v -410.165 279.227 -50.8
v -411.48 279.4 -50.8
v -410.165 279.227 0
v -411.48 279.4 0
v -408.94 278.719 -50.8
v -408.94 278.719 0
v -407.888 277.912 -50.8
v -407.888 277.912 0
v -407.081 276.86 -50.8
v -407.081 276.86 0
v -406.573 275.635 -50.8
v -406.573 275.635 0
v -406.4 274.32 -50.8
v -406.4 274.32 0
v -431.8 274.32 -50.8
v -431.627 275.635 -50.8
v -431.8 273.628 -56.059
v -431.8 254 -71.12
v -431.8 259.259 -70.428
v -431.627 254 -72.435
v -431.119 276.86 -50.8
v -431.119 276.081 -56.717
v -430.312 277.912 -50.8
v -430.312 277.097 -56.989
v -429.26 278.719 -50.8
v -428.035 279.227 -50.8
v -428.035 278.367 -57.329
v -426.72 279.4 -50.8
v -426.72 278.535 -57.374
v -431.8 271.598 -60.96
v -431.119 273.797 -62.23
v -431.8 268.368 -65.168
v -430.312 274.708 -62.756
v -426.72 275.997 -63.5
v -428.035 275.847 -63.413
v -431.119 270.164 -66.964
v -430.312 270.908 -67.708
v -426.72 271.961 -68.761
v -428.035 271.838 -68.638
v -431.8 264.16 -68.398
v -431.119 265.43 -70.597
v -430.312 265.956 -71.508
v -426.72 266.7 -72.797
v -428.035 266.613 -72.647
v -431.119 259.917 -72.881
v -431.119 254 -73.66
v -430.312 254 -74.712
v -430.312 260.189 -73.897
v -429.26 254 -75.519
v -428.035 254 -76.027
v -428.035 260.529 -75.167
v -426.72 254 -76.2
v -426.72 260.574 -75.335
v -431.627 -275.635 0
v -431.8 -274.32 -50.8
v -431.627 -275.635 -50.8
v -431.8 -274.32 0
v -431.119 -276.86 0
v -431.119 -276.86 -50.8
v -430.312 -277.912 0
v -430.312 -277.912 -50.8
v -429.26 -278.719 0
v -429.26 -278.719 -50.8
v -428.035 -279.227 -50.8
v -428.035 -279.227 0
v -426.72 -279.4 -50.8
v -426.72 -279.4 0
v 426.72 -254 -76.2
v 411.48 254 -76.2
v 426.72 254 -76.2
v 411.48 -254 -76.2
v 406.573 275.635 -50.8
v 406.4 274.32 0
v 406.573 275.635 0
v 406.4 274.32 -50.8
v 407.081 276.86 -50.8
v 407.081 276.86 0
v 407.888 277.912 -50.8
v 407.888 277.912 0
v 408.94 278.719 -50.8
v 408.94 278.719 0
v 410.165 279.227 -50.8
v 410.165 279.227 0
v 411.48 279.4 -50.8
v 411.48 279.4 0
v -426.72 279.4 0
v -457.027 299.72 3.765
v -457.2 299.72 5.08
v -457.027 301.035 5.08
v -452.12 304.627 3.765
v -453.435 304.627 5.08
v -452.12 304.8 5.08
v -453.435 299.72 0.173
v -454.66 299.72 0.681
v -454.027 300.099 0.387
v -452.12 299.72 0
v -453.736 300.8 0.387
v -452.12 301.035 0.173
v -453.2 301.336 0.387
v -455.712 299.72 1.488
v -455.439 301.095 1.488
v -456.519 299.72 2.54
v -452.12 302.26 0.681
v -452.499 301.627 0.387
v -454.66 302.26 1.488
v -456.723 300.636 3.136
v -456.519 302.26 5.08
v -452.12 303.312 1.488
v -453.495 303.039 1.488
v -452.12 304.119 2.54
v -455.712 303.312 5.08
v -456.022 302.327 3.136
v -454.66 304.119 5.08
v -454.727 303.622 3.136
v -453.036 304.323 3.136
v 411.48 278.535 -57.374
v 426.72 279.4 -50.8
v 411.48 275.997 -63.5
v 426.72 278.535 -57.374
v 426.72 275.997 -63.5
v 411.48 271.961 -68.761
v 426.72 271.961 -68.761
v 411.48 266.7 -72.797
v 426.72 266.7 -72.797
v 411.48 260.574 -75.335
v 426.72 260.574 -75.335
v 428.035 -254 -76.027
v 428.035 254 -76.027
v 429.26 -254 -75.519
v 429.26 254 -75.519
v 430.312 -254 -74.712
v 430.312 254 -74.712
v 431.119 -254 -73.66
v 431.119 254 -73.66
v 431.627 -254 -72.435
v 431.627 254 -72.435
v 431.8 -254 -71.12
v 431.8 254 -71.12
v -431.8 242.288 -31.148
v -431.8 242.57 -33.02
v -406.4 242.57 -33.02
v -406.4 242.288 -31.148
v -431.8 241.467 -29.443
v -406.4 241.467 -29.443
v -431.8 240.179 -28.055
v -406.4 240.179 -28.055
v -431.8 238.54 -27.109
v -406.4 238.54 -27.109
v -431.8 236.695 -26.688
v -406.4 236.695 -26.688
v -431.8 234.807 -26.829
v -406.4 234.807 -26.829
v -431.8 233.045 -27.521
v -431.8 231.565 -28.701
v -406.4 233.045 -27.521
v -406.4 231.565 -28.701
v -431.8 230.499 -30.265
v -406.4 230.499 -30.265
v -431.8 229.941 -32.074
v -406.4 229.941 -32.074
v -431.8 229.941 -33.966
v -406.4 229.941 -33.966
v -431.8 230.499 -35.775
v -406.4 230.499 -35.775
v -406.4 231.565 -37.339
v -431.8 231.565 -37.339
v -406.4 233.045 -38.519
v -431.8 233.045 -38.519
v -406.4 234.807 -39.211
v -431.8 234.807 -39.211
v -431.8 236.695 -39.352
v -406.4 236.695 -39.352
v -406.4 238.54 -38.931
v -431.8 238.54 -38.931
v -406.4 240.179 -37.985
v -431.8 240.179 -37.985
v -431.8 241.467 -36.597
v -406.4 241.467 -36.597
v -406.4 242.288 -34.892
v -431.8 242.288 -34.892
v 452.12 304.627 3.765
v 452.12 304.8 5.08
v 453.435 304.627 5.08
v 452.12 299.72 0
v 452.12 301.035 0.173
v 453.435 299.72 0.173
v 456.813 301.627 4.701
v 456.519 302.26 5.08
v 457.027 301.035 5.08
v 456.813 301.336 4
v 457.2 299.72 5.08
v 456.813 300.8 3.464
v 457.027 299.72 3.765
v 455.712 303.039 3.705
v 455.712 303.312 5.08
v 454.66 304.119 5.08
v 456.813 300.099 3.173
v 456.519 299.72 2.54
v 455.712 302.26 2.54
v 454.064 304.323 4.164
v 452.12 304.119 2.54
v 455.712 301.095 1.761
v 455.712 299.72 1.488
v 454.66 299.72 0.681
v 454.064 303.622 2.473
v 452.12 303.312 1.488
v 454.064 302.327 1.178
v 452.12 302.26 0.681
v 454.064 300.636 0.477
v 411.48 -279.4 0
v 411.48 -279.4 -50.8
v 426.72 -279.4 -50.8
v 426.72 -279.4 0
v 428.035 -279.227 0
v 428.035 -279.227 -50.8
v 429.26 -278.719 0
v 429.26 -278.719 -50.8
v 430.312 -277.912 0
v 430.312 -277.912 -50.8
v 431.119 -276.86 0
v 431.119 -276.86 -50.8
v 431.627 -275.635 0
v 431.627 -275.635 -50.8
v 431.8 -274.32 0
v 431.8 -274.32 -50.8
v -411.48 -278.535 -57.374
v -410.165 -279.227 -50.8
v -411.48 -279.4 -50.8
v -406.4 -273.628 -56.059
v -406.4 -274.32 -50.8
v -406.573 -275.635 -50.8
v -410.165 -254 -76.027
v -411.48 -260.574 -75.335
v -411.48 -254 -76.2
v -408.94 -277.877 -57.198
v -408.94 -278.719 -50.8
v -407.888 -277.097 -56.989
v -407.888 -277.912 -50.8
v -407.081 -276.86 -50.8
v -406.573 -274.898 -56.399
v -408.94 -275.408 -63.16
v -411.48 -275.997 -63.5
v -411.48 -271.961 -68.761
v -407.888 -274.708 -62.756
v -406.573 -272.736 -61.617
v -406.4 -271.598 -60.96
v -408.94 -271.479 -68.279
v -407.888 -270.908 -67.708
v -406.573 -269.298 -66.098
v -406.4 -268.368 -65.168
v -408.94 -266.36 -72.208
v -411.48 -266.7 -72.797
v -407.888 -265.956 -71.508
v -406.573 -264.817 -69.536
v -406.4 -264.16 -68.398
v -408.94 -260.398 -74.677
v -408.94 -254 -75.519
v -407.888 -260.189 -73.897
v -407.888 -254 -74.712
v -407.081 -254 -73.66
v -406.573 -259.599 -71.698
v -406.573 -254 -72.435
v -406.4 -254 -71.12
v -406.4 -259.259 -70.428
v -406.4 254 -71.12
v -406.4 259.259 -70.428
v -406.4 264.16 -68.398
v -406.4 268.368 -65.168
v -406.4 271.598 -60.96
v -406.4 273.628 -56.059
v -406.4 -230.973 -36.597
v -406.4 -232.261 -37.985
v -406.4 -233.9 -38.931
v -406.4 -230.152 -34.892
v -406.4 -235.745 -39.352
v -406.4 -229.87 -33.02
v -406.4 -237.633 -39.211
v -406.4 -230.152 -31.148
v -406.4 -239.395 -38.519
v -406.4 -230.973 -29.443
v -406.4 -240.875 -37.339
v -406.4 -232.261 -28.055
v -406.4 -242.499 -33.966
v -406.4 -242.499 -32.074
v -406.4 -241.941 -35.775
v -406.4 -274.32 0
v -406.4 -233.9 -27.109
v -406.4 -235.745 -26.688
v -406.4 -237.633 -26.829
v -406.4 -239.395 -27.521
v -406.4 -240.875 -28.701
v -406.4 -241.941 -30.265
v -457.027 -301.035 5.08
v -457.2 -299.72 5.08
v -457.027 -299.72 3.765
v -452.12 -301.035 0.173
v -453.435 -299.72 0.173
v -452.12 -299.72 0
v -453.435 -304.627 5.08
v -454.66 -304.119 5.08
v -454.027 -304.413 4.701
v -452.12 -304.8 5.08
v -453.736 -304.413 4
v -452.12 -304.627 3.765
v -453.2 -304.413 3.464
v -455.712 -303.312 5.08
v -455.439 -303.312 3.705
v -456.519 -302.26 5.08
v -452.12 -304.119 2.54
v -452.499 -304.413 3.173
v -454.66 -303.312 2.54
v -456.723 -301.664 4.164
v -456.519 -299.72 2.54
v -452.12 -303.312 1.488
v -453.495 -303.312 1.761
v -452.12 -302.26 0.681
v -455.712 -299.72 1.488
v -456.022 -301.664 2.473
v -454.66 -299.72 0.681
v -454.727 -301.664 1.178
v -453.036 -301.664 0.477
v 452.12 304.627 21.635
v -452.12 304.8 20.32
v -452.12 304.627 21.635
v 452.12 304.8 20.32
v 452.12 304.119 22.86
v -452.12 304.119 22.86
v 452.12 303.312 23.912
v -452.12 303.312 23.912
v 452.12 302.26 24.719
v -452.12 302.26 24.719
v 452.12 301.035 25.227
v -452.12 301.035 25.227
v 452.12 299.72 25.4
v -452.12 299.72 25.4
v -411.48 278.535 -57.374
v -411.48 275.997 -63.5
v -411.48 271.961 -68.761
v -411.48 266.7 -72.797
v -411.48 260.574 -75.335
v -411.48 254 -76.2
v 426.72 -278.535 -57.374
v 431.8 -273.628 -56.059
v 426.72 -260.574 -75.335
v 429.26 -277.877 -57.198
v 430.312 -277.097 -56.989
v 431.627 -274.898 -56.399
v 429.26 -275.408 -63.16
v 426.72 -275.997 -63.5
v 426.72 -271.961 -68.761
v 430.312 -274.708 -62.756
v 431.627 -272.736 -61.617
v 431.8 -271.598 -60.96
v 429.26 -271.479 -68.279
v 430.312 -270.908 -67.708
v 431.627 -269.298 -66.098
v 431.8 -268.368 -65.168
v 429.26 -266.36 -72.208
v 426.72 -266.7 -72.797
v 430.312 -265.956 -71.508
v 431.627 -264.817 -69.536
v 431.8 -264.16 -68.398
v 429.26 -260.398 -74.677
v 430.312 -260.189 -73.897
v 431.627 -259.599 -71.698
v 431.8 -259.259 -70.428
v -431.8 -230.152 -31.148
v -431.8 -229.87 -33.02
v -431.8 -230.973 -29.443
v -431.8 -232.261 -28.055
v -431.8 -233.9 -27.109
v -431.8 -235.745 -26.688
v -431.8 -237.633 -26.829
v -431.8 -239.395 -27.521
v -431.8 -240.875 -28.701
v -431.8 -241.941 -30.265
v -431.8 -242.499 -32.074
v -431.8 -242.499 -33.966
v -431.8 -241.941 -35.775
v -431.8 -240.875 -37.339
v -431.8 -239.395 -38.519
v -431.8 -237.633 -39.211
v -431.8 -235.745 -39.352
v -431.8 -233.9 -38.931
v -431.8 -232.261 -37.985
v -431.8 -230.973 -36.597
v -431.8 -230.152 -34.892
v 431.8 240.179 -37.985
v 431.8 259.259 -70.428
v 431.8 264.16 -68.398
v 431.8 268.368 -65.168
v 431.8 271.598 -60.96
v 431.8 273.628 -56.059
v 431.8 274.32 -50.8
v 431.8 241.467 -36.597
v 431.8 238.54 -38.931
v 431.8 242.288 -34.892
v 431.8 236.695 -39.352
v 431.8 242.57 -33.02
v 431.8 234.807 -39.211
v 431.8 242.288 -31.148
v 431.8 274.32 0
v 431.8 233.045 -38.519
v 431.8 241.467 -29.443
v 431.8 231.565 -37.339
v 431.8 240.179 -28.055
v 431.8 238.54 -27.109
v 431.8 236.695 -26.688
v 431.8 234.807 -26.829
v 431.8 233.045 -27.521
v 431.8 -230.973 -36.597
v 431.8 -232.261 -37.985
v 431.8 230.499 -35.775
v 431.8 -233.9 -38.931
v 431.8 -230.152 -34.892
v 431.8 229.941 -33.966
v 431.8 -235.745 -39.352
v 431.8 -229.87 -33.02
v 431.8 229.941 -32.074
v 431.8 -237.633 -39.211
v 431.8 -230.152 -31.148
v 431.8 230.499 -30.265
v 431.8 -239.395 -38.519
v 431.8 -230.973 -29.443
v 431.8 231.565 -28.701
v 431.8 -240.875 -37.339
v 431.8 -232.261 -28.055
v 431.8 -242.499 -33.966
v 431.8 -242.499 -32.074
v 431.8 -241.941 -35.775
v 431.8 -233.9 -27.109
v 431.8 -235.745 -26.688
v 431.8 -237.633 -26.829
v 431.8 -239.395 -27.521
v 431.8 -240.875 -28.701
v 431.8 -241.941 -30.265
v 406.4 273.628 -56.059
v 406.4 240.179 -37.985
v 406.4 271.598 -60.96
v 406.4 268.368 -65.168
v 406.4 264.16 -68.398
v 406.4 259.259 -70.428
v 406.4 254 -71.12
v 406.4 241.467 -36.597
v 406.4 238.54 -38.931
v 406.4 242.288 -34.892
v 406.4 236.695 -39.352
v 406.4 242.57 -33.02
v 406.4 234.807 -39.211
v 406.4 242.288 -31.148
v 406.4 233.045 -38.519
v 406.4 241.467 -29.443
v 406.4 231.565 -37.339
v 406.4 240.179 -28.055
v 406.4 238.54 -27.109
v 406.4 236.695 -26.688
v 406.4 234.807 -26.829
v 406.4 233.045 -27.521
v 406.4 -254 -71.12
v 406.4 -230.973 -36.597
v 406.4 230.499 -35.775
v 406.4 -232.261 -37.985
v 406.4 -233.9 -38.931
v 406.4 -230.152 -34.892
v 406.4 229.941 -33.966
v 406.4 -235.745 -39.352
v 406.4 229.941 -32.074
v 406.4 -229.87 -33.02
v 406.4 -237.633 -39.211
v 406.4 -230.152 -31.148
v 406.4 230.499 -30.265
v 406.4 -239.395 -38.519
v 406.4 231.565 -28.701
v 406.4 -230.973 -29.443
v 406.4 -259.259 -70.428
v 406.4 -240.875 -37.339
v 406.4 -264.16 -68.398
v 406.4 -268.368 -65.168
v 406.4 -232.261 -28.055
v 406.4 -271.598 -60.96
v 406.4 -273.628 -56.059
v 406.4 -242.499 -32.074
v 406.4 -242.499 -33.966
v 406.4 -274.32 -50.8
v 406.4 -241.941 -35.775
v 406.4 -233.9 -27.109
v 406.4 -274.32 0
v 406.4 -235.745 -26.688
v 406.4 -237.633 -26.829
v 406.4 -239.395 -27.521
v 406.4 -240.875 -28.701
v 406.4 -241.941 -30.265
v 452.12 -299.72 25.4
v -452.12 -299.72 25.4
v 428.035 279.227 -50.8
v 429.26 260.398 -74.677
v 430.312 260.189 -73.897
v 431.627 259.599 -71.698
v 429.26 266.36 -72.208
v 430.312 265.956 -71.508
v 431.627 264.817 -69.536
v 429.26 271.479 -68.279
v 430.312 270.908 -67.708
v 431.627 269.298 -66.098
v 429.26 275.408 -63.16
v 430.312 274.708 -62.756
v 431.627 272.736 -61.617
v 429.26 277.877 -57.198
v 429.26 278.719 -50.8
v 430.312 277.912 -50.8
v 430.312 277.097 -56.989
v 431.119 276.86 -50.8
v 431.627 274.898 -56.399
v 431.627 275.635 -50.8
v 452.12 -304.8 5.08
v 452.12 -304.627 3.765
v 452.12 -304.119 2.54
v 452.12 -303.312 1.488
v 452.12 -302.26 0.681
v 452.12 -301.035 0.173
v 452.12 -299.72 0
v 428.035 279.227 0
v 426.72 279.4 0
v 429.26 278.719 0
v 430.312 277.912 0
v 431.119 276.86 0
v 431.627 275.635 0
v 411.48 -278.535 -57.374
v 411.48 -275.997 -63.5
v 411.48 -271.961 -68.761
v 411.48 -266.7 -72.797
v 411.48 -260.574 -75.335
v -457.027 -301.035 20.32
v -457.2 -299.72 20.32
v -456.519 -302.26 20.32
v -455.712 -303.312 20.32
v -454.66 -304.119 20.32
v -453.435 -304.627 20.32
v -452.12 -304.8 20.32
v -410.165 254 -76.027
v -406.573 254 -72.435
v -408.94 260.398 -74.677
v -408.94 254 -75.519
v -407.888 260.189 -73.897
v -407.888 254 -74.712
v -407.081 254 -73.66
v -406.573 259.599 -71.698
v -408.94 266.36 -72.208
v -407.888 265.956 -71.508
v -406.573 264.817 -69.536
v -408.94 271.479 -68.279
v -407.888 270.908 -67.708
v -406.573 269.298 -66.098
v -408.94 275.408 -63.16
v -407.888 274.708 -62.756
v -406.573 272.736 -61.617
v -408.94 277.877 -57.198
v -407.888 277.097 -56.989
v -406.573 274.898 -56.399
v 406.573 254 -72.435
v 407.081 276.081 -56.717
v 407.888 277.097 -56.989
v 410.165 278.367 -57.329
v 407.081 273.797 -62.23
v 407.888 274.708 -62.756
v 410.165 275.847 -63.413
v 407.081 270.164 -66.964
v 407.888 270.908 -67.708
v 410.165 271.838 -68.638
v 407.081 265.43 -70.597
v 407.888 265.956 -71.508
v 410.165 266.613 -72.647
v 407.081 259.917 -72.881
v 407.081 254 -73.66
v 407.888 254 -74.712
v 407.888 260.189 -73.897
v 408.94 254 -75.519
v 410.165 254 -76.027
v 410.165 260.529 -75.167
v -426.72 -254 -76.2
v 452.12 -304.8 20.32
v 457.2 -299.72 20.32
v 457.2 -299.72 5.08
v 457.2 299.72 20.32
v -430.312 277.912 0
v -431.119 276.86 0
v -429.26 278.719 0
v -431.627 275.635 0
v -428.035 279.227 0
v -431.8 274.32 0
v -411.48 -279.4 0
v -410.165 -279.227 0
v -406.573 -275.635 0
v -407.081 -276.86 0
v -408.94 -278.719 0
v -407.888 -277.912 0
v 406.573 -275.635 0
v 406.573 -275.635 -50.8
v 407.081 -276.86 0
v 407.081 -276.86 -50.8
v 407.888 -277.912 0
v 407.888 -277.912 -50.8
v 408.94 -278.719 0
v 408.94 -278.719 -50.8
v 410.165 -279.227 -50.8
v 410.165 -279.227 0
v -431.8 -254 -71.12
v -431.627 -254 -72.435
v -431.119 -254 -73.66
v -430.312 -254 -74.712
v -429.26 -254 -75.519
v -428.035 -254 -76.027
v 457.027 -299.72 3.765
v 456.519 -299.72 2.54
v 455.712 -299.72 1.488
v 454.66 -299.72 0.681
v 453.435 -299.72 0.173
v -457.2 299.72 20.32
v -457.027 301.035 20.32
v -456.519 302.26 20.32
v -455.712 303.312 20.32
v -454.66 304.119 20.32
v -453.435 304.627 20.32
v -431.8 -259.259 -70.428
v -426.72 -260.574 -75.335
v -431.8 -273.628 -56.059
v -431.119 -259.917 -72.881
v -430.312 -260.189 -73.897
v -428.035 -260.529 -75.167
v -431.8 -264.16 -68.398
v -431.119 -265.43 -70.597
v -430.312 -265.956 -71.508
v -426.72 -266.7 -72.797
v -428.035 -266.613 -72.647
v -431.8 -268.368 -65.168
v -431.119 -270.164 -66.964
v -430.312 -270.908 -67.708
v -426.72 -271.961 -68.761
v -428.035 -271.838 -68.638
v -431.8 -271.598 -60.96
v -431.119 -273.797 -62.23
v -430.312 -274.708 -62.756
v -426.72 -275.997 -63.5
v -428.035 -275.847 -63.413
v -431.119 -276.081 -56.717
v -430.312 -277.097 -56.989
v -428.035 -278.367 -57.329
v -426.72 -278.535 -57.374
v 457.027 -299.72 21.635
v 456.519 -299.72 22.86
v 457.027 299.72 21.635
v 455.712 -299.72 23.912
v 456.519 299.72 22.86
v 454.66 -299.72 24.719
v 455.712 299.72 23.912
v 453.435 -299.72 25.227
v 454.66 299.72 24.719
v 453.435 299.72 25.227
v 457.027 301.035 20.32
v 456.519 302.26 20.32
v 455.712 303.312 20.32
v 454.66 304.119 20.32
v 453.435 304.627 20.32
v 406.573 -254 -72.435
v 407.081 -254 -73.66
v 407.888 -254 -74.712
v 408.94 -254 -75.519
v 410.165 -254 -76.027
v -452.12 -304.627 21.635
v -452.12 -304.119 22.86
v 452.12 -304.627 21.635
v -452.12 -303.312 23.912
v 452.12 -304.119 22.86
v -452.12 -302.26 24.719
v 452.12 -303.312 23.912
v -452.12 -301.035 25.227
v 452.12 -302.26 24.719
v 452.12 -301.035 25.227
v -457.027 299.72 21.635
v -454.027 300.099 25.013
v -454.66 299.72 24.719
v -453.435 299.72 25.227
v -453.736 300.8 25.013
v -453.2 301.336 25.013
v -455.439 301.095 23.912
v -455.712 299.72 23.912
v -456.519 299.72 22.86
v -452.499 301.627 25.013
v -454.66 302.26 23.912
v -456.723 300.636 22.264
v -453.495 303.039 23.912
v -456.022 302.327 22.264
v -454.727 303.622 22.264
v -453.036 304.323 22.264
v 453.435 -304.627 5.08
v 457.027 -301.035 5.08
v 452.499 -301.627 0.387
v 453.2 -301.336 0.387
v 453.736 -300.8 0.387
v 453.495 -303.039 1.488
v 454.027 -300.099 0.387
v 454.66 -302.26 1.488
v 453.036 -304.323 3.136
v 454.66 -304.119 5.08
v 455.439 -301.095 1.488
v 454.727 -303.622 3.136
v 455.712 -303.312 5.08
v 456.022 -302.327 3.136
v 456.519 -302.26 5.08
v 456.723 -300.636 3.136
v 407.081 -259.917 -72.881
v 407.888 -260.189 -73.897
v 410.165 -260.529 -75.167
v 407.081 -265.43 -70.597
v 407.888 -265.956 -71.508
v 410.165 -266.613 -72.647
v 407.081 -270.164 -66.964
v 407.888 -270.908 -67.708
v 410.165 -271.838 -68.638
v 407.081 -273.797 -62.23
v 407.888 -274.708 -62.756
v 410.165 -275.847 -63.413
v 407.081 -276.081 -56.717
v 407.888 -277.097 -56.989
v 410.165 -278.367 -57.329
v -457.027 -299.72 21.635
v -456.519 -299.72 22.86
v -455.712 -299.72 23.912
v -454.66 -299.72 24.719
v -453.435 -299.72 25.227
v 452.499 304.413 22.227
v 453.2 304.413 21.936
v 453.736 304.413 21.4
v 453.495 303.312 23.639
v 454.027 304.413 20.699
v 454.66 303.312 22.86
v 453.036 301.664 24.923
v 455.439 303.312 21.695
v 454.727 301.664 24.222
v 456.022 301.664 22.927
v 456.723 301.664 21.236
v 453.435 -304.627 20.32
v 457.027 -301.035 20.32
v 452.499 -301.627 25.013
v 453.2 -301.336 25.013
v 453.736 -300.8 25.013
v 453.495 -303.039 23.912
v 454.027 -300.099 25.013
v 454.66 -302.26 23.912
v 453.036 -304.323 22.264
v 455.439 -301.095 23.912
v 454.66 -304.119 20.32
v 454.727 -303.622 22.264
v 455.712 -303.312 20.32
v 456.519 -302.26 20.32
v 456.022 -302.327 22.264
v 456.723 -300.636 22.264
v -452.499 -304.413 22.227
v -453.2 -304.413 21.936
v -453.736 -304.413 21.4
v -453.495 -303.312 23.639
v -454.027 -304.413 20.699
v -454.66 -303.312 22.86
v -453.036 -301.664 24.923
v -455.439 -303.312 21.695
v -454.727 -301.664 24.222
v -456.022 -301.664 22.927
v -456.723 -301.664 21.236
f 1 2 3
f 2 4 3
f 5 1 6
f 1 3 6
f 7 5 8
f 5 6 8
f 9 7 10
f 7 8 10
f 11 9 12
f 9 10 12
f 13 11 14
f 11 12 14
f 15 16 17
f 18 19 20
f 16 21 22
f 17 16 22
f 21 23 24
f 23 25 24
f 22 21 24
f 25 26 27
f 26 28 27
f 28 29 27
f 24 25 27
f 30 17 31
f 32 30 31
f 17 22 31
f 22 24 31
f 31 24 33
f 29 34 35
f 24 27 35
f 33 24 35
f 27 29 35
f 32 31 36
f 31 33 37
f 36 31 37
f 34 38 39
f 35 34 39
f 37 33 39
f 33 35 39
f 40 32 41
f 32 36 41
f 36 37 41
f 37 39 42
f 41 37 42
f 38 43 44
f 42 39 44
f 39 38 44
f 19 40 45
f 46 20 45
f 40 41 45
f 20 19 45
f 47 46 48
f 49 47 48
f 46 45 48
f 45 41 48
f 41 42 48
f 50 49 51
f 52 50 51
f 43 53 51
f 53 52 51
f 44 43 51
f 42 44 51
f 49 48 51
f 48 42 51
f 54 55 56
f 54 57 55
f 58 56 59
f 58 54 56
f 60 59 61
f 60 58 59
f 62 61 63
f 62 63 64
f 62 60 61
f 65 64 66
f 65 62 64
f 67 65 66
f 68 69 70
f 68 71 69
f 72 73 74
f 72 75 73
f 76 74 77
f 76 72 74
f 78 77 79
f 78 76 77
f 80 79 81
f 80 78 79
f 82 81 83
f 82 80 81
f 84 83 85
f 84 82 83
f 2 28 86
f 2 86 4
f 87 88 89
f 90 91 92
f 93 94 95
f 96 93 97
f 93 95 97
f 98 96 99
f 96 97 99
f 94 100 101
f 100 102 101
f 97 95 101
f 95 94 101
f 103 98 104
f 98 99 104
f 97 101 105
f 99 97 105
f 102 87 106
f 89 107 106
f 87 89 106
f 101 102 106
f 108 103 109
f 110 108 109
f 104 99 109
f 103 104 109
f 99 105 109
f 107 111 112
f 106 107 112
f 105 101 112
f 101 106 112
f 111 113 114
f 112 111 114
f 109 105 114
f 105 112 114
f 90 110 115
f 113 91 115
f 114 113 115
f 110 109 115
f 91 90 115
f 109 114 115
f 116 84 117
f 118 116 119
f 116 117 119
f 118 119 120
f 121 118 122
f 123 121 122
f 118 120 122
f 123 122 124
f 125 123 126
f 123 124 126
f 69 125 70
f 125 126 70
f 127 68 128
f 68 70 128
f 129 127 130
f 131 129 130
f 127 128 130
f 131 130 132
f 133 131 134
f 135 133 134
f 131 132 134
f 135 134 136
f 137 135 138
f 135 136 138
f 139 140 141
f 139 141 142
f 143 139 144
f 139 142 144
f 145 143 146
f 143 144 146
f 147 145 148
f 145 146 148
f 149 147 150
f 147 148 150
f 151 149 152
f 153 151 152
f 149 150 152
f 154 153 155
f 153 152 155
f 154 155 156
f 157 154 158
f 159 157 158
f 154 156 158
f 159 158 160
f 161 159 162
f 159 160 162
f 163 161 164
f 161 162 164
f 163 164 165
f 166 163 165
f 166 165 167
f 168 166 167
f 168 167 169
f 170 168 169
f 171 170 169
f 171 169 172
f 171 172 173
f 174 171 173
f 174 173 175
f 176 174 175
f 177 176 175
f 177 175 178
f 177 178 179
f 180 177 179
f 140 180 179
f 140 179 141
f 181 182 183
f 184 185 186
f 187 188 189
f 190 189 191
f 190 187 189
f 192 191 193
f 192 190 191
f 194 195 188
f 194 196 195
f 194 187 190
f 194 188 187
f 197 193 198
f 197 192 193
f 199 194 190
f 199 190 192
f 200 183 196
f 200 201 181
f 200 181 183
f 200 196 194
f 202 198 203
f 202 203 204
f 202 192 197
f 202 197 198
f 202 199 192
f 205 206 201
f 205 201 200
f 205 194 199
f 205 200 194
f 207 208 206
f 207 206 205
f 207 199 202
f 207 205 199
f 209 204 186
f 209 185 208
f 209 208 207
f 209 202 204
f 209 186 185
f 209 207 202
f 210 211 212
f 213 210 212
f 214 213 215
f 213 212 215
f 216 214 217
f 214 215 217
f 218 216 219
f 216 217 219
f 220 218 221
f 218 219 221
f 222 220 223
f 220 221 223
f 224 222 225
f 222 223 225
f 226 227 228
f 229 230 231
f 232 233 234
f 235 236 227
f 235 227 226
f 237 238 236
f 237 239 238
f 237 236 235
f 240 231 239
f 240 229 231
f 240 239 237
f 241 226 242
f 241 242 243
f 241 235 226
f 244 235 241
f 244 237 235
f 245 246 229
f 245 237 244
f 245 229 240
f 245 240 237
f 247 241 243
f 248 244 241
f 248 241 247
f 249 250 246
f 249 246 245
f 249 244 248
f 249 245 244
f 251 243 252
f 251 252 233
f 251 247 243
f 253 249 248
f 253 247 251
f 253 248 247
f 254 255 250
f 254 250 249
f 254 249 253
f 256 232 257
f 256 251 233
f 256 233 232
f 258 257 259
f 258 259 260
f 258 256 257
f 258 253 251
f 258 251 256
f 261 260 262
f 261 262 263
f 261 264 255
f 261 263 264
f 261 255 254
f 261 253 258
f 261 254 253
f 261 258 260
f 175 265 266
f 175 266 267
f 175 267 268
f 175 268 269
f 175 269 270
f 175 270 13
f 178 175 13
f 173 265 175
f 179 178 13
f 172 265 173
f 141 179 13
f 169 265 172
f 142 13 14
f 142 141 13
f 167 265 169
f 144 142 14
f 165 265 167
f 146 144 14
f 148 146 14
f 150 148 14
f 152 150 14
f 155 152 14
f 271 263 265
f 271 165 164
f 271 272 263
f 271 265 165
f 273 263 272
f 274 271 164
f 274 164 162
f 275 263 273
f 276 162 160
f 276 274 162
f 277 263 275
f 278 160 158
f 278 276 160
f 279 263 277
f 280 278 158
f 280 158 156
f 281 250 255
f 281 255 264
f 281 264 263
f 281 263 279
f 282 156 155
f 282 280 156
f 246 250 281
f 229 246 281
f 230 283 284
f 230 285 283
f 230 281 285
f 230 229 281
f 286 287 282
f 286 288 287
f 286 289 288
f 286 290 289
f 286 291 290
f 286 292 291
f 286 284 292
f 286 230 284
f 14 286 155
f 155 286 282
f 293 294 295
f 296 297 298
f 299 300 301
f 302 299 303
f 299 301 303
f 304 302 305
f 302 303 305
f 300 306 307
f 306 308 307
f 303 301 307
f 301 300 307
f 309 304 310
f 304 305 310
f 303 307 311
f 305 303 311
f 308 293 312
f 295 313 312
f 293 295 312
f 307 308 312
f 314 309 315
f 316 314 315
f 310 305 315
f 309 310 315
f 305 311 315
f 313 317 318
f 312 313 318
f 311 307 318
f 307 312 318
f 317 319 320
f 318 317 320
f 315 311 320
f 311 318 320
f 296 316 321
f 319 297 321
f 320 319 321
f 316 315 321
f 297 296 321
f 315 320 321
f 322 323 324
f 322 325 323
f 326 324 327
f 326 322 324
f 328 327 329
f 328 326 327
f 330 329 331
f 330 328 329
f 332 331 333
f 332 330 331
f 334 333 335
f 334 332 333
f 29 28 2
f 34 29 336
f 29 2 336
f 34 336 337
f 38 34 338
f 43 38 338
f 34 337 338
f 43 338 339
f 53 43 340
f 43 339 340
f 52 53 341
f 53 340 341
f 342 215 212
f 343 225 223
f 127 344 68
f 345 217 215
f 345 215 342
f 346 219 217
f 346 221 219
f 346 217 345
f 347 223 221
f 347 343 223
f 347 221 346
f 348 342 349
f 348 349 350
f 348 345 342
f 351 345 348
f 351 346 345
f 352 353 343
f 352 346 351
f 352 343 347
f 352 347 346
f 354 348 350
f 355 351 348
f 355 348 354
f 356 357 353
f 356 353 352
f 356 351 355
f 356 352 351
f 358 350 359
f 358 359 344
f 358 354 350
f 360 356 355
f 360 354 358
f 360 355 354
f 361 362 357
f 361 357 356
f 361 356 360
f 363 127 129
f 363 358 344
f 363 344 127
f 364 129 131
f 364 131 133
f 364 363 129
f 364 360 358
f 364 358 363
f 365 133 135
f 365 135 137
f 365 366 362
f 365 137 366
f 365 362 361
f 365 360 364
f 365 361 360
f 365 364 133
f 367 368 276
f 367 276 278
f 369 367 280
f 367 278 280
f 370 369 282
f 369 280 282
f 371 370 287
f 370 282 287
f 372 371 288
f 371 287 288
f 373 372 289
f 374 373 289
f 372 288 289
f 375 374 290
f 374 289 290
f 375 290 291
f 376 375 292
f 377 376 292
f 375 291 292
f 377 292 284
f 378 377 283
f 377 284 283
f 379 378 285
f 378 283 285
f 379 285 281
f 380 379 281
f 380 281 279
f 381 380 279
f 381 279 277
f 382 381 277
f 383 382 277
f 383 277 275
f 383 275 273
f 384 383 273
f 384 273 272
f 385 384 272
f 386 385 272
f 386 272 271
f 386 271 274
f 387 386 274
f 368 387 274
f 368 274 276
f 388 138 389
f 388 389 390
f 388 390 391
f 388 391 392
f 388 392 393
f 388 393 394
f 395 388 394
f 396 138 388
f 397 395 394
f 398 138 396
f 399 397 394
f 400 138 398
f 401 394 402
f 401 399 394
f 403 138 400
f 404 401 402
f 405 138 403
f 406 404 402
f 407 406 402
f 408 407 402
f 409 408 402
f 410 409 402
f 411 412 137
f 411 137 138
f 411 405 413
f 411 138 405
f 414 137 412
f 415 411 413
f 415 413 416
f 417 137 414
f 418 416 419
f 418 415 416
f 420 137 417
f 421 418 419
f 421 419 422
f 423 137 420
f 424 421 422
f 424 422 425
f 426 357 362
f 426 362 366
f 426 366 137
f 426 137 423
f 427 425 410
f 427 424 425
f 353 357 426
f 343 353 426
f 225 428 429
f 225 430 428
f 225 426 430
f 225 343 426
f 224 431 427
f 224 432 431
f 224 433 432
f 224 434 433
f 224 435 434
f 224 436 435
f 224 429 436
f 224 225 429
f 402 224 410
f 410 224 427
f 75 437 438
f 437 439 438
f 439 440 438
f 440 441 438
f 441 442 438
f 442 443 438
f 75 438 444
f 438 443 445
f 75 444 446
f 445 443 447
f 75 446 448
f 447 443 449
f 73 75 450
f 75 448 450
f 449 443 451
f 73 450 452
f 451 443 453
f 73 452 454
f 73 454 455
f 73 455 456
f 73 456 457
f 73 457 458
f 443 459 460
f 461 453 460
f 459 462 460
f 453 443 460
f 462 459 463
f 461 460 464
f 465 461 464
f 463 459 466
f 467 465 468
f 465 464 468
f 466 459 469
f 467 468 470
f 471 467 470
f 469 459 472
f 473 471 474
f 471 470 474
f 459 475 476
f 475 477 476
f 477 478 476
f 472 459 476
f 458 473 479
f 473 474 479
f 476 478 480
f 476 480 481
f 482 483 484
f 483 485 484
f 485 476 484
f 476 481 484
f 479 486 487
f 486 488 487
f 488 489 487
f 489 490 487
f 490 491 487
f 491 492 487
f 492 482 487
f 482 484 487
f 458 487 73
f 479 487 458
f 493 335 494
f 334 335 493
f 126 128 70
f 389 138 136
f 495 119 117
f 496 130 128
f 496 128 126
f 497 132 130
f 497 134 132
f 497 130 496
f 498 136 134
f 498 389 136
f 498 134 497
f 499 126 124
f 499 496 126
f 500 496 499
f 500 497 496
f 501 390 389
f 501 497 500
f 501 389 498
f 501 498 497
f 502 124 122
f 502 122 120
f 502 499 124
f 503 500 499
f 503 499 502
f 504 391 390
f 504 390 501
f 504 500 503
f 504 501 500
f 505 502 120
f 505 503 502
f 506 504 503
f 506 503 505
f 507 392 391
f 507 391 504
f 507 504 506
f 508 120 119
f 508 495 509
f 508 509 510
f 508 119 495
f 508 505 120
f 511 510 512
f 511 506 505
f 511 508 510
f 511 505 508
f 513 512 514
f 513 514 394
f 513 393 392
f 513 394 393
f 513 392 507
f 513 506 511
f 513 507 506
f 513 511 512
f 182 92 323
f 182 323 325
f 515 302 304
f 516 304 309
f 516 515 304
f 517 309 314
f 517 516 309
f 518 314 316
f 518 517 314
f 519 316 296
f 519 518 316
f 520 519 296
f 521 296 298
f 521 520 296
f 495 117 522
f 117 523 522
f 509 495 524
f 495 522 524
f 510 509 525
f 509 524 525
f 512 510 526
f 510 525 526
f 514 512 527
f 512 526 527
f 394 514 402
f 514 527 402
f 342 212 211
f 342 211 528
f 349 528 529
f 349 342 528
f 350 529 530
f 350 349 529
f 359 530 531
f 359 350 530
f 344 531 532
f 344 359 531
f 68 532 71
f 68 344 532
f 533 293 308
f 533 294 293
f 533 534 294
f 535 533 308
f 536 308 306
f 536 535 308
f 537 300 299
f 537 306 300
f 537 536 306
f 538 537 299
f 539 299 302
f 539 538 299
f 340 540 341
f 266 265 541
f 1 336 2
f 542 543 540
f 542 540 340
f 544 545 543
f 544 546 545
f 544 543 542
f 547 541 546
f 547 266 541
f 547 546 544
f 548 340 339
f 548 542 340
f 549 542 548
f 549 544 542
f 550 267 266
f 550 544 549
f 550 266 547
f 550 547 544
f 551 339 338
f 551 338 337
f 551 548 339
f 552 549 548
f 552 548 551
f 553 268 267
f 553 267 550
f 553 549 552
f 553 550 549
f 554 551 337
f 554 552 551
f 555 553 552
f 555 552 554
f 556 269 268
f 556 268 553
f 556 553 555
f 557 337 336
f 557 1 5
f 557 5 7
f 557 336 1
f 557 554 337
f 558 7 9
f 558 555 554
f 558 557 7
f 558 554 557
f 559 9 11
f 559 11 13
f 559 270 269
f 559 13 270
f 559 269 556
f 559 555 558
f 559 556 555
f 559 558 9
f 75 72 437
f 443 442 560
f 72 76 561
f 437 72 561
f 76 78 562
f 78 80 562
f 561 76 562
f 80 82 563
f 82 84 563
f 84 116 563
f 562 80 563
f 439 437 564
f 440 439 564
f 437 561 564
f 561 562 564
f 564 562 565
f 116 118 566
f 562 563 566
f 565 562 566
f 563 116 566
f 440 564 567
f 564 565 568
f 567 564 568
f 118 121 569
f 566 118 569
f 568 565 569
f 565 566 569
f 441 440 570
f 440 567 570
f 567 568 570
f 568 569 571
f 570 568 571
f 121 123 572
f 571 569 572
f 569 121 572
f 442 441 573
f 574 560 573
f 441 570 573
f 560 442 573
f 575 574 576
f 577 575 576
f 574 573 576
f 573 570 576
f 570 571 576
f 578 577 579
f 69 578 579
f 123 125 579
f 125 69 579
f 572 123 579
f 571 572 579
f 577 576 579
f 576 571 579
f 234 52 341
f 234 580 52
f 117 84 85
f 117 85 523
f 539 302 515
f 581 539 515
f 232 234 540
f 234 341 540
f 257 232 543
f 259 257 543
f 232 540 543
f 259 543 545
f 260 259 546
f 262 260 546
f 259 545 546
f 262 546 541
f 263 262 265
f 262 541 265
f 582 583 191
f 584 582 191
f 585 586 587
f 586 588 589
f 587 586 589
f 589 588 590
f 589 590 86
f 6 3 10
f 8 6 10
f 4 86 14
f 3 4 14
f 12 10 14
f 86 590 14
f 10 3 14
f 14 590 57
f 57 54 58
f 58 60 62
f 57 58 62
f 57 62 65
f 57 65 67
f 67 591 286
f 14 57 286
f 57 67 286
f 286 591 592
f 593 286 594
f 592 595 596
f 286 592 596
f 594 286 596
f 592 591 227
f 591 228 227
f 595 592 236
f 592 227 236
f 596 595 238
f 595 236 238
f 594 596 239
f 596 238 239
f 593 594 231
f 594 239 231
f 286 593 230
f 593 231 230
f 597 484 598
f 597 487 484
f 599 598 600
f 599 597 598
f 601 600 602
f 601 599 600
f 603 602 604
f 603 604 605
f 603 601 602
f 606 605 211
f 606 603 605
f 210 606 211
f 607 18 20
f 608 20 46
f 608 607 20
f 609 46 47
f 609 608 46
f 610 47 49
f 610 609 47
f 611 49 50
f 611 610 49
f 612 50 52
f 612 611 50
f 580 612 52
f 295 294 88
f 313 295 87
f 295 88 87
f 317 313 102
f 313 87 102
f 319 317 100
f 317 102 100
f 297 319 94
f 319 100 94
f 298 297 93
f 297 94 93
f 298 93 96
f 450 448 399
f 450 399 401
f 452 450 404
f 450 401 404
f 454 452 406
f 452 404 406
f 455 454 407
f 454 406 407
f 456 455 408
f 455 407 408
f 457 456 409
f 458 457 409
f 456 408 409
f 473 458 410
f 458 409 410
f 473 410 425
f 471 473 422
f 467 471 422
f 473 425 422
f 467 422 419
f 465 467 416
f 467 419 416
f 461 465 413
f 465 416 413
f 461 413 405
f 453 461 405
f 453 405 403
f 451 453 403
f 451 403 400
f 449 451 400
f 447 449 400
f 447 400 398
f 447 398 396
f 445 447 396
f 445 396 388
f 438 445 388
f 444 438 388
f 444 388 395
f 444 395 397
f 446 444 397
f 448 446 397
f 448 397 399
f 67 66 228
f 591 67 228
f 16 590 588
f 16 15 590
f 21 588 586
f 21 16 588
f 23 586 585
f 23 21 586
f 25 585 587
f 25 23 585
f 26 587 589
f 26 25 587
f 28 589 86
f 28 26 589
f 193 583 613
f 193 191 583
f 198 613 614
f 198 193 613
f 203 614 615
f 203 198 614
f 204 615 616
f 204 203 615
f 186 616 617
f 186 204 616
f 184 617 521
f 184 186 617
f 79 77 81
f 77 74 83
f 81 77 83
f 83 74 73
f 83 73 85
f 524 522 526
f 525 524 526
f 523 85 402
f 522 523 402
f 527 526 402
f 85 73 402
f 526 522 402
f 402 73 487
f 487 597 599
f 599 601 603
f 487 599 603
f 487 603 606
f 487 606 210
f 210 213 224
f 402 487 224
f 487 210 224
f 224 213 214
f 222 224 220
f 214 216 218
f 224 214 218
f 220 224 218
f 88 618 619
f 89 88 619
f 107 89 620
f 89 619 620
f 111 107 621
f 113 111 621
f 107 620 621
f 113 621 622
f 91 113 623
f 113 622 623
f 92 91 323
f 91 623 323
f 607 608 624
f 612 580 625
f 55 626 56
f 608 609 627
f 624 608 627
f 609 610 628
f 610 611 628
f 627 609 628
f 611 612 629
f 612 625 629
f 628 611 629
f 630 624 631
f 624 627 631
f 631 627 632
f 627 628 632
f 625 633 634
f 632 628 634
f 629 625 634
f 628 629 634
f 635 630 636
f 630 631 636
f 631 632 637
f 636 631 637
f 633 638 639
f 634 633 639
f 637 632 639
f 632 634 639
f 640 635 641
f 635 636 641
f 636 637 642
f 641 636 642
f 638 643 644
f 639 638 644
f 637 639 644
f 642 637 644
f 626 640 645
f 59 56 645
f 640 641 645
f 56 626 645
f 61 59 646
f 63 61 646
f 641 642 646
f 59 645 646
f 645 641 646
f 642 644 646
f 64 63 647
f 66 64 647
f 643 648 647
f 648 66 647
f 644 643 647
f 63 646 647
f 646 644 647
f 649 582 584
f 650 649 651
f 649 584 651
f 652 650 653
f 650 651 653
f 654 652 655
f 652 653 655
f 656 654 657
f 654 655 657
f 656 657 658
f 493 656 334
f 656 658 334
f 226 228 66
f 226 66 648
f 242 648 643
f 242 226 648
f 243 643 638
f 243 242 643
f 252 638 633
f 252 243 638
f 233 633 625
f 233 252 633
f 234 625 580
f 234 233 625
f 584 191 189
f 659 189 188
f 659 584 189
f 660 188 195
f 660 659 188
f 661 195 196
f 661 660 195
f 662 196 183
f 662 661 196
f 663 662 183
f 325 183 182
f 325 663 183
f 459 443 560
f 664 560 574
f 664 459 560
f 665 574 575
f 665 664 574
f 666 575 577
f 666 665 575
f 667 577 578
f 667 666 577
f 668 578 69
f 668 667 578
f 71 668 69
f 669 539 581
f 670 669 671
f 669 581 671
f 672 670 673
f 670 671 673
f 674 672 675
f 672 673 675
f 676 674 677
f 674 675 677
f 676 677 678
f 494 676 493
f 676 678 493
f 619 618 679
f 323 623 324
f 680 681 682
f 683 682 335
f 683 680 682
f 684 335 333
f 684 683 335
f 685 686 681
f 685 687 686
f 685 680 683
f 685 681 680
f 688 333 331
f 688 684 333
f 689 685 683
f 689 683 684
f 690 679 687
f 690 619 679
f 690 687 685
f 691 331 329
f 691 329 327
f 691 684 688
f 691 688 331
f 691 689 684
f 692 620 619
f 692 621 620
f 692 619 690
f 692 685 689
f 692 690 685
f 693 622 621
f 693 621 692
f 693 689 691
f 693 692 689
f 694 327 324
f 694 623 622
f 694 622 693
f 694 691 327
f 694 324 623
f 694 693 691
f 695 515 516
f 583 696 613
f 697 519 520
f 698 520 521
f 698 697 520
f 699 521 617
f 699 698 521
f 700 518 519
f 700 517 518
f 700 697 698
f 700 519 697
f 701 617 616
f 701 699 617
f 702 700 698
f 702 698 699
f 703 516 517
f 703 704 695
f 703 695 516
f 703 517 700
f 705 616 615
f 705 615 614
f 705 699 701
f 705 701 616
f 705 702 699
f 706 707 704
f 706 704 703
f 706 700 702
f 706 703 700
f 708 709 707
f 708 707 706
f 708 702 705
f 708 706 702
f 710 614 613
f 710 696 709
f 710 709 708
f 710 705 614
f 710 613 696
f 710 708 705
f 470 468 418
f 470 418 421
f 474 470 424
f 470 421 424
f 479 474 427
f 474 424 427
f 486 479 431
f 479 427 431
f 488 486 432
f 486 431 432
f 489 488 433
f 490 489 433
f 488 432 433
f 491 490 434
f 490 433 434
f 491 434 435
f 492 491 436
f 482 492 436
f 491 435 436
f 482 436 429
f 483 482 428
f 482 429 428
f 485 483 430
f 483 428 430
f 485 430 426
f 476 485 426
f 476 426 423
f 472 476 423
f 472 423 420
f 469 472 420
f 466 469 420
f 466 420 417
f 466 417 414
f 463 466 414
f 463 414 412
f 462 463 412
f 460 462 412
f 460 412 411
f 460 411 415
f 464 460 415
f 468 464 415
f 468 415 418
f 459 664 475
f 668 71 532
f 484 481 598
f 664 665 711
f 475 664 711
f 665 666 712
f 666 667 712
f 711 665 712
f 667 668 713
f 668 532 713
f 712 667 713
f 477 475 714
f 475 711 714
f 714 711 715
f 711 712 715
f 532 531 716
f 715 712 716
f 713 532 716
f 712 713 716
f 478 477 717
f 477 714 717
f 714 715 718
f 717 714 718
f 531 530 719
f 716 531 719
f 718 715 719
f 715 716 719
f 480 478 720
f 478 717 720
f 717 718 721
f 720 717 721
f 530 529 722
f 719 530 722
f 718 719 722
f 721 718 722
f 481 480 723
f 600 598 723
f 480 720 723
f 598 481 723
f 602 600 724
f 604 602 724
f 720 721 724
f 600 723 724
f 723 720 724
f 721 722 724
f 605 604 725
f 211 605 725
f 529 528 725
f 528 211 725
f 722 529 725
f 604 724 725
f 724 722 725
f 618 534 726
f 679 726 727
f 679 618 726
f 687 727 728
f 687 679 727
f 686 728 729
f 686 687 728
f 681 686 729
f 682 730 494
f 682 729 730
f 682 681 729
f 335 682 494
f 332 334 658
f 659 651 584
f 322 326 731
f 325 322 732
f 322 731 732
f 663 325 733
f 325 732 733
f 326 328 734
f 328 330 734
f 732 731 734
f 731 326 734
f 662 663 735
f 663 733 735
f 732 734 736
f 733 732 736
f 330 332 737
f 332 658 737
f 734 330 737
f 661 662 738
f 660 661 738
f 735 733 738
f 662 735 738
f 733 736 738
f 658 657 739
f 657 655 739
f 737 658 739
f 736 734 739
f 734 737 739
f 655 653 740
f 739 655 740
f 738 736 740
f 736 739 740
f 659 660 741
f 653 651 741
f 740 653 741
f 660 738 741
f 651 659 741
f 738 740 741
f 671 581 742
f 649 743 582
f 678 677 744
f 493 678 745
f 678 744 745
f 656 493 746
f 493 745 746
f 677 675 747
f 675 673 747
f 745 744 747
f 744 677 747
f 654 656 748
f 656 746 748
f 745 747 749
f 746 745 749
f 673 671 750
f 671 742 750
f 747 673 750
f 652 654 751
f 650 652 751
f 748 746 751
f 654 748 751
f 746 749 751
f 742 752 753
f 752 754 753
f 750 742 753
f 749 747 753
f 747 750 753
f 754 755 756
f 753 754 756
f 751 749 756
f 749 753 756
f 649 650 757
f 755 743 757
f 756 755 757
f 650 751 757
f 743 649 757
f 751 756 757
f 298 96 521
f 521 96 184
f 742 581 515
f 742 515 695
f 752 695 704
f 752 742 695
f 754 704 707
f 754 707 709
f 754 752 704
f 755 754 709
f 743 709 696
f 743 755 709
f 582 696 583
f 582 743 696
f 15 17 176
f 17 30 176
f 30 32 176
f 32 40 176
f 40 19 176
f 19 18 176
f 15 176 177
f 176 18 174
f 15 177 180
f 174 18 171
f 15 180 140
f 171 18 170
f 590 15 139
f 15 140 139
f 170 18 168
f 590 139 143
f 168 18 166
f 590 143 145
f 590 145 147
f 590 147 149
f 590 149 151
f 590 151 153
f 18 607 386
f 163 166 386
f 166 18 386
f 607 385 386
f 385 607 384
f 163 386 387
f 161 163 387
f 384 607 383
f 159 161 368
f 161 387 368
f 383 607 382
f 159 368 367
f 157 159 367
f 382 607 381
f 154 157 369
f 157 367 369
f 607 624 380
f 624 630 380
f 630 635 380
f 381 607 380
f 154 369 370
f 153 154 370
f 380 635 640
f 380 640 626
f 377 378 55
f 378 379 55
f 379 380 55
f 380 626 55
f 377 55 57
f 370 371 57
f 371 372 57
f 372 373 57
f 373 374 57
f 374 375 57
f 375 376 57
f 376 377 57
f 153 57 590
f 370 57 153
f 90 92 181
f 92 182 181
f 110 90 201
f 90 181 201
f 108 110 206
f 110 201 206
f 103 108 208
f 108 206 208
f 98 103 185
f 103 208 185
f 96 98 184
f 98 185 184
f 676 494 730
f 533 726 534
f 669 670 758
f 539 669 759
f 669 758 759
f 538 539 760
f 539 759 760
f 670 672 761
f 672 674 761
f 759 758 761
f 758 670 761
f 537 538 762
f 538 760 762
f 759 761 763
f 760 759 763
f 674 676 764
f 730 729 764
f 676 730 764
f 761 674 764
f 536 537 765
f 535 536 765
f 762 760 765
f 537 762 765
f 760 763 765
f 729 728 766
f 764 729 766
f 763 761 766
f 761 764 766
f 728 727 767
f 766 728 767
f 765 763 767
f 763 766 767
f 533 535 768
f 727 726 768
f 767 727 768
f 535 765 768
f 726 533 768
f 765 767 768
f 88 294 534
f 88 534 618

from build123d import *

# Parameters (mm, degrees)
F1_W     = 914.4
F1_H     = 609.6
F2_DEPTH = 25.4
F3_R     = 5.08
F4_W     = 25.4
F4_H     = 76.2
F5_DEPTH = 279.4
F6_R     = 25.4
F6_2_R   = 25.4
F7_R     = 5.08
F7_2_R   = 5.08
F8_R     = 6.35
F9_DEPTH = 863.6


with BuildPart() as f2:
    # F1 (on Top) → F2 (new body)
    with BuildSketch(Plane.XY):
        Rectangle(F1_W, F1_H)
    extrude(amount=F2_DEPTH)

    # F3
    f3_edges = [f2.edges().sort_by_distance(p)[0] for p in [
        (-457.2, 304.8, 12.7),
        (-457.2, 0, 25.4),
        (457.2, -304.8, 12.7),
        (0, -304.8, 25.4),
        (-457.2, 0, 0),
        (457.2, 0, 25.4),
        (0, 304.8, 25.4),
        (-457.2, -304.8, 12.7),
        (0, -304.8, 0),
        (0, 304.8, 0),
        (457.2, 304.8, 12.7),
        (457.2, 0, 0),
    ]]
    fillet(f3_edges, radius=F3_R)


with BuildPart() as f5:
    # F4 (on Front) → F5 (new body, symmetric)
    with BuildSketch(Plane.XZ):
        with Locations((-419.1, -38.1)):
            Rectangle(F4_W, F4_H)
    extrude(amount=F5_DEPTH, both=True)

    # F6
    f6_edges = [f5.edges().sort_by_distance(p)[0] for p in [
        (-419.1, -279.4, -76.2),
        (-419.1, 279.4, -76.2),
    ]]
    fillet(f6_edges, radius=F6_R)

    # F7#2
    f7_2_edges = [f5.edges().sort_by_distance(p)[0] for p in [
        (-406.4, -271.960512, -68.760512),
        (-406.4, 271.960512, -68.760512),
        (-431.8, 271.960512, -68.760512),
        (-431.8, -271.960512, -68.760512),
        (-406.4, 279.4, -25.4),
        (-406.4, 0, -76.2),
        (-406.4, -279.4, -25.4),
        (-419.1, -279.4, -50.8),
        (-419.1, 279.4, -50.8),
        (-431.8, 279.4, -25.4),
        (-419.1, -254, -76.2),
        (-431.8, -279.4, -25.4),
        (-419.1, 254, -76.2),
        (-431.8, 0, -76.2),
    ]]
    fillet(f7_2_edges, radius=F7_2_R)


with BuildPart() as f5b:
    # F4 (on Front) → F5, piece 2 (new body, symmetric)
    with BuildSketch(Plane.XZ):
        with Locations((419.1, -38.1)):
            Rectangle(F4_W, F4_H)
    extrude(amount=F5_DEPTH, both=True)

    # F6#2
    f6_2_edges = [f5b.edges().sort_by_distance(p)[0] for p in [
        (419.1, -279.4, -76.2),
        (419.1, 279.4, -76.2),
    ]]
    fillet(f6_2_edges, radius=F6_2_R)

    # F7
    f7_edges = [f5b.edges().sort_by_distance(p)[0] for p in [
        (431.8, -271.960512, -68.760512),
        (431.8, 271.960512, -68.760512),
        (431.8, -279.4, -25.4),
        (431.8, 279.4, -25.4),
        (406.4, 271.960512, -68.760512),
        (431.8, 0, -76.2),
        (406.4, -271.960512, -68.760512),
        (406.4, 0, -76.2),
        (406.4, -279.4, -25.4),
        (419.1, -254, -76.2),
        (419.1, 254, -76.2),
        (406.4, 279.4, -25.4),
        (419.1, 279.4, -50.8),
        (419.1, -279.4, -50.8),
    ]]
    fillet(f7_edges, radius=F7_R)


with BuildPart() as f9_tool:
    # F8 (on face) → F9 (new body, through all)
    with BuildSketch(Plane.YZ.offset(431.8)):
        with Locations((-236.22, -33.02)):
            Circle(F8_R)
        with Locations((236.22, -33.02)):
            Circle(F8_R)
    extrude(amount=-F9_DEPTH)


with BuildPart() as f5_1:
    add(f5.part)

    # F9: cut by f9_tool
    add(f9_tool.part, mode=Mode.SUBTRACT)


with BuildPart() as f5b_1:
    add(f5b.part)

    # F9: cut by f9_tool
    add(f9_tool.part, mode=Mode.SUBTRACT)


solid = Compound([f2.part, f5_1.part, f5b_1.part])
